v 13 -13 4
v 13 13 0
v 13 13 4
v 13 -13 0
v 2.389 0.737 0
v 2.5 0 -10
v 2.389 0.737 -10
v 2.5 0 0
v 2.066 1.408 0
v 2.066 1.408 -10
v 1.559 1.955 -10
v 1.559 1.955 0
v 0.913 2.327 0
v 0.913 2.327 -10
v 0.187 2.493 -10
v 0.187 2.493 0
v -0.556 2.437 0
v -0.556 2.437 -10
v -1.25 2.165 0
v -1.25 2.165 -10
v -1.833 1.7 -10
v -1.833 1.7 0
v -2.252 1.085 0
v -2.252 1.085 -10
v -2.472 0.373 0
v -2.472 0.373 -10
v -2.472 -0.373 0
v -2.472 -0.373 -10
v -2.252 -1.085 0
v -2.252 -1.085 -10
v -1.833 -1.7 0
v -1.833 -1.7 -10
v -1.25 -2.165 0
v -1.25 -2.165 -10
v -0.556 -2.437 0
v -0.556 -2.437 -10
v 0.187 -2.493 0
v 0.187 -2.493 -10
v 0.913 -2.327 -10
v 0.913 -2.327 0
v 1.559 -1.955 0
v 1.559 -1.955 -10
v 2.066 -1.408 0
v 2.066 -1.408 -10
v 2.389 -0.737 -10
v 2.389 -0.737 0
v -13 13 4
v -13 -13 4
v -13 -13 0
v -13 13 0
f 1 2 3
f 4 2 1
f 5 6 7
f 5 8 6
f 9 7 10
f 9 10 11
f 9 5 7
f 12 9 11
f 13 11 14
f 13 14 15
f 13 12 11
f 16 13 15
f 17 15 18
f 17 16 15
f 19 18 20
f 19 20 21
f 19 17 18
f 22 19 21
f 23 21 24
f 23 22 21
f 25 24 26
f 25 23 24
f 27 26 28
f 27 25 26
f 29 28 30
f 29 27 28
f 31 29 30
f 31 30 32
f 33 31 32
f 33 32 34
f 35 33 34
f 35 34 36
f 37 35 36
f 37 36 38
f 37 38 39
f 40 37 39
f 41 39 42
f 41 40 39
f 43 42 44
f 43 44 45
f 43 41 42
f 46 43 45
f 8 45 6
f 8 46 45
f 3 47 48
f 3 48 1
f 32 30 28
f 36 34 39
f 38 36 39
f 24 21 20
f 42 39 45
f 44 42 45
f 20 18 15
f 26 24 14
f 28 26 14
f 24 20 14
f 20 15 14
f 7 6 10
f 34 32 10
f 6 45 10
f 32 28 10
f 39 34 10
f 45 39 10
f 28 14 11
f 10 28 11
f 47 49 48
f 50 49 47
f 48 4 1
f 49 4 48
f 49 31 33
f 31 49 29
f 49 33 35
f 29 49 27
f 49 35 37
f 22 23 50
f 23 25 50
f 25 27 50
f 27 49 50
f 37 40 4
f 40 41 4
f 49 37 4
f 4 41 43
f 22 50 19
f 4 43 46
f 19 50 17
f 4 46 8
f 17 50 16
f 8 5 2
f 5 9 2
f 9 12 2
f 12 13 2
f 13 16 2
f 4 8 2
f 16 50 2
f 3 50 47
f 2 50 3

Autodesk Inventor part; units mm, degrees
ref_plane "YZ Plane" through (0, 0, 0) normal (1, 0, 0) x (0, 1, 0)
ref_plane "XZ Plane" through (0, 0, 0) normal (0, 1, 0) x (-1, 0, 0)
ref_plane "XY Plane" through (0, 0, 0) normal (0, 0, 1) x (1, 0, 0)
sketch "Sketch1" plane through (0, 0, 0) normal (0, 0, 1) x (1, 0, 0)
  circle A0 centre (0, 0) radius 2.5
  line L0 (-13, 13) -> (13, 13)
  line L1 (13, 13) -> (13, -13)
  line L2 (13, -13) -> (-13, -13)
  line L3 (-13, -13) -> (-13, 13)
  line L4 (-13, 13) -> (13, -13) construction
  line L5 (13, 13) -> (-13, -13) construction
  dimension "d0" = 5
  dimension "d1" = 26
  dimension "d2" = 26
extrude "Extrusion1" add sketch "Sketch1" against normal blind 10 contours A0
extrude "Extrusion2" add sketch "Sketch1" along normal blind 4 contours A0 | L0 L1 L2 L3
properties part number "corredor"
